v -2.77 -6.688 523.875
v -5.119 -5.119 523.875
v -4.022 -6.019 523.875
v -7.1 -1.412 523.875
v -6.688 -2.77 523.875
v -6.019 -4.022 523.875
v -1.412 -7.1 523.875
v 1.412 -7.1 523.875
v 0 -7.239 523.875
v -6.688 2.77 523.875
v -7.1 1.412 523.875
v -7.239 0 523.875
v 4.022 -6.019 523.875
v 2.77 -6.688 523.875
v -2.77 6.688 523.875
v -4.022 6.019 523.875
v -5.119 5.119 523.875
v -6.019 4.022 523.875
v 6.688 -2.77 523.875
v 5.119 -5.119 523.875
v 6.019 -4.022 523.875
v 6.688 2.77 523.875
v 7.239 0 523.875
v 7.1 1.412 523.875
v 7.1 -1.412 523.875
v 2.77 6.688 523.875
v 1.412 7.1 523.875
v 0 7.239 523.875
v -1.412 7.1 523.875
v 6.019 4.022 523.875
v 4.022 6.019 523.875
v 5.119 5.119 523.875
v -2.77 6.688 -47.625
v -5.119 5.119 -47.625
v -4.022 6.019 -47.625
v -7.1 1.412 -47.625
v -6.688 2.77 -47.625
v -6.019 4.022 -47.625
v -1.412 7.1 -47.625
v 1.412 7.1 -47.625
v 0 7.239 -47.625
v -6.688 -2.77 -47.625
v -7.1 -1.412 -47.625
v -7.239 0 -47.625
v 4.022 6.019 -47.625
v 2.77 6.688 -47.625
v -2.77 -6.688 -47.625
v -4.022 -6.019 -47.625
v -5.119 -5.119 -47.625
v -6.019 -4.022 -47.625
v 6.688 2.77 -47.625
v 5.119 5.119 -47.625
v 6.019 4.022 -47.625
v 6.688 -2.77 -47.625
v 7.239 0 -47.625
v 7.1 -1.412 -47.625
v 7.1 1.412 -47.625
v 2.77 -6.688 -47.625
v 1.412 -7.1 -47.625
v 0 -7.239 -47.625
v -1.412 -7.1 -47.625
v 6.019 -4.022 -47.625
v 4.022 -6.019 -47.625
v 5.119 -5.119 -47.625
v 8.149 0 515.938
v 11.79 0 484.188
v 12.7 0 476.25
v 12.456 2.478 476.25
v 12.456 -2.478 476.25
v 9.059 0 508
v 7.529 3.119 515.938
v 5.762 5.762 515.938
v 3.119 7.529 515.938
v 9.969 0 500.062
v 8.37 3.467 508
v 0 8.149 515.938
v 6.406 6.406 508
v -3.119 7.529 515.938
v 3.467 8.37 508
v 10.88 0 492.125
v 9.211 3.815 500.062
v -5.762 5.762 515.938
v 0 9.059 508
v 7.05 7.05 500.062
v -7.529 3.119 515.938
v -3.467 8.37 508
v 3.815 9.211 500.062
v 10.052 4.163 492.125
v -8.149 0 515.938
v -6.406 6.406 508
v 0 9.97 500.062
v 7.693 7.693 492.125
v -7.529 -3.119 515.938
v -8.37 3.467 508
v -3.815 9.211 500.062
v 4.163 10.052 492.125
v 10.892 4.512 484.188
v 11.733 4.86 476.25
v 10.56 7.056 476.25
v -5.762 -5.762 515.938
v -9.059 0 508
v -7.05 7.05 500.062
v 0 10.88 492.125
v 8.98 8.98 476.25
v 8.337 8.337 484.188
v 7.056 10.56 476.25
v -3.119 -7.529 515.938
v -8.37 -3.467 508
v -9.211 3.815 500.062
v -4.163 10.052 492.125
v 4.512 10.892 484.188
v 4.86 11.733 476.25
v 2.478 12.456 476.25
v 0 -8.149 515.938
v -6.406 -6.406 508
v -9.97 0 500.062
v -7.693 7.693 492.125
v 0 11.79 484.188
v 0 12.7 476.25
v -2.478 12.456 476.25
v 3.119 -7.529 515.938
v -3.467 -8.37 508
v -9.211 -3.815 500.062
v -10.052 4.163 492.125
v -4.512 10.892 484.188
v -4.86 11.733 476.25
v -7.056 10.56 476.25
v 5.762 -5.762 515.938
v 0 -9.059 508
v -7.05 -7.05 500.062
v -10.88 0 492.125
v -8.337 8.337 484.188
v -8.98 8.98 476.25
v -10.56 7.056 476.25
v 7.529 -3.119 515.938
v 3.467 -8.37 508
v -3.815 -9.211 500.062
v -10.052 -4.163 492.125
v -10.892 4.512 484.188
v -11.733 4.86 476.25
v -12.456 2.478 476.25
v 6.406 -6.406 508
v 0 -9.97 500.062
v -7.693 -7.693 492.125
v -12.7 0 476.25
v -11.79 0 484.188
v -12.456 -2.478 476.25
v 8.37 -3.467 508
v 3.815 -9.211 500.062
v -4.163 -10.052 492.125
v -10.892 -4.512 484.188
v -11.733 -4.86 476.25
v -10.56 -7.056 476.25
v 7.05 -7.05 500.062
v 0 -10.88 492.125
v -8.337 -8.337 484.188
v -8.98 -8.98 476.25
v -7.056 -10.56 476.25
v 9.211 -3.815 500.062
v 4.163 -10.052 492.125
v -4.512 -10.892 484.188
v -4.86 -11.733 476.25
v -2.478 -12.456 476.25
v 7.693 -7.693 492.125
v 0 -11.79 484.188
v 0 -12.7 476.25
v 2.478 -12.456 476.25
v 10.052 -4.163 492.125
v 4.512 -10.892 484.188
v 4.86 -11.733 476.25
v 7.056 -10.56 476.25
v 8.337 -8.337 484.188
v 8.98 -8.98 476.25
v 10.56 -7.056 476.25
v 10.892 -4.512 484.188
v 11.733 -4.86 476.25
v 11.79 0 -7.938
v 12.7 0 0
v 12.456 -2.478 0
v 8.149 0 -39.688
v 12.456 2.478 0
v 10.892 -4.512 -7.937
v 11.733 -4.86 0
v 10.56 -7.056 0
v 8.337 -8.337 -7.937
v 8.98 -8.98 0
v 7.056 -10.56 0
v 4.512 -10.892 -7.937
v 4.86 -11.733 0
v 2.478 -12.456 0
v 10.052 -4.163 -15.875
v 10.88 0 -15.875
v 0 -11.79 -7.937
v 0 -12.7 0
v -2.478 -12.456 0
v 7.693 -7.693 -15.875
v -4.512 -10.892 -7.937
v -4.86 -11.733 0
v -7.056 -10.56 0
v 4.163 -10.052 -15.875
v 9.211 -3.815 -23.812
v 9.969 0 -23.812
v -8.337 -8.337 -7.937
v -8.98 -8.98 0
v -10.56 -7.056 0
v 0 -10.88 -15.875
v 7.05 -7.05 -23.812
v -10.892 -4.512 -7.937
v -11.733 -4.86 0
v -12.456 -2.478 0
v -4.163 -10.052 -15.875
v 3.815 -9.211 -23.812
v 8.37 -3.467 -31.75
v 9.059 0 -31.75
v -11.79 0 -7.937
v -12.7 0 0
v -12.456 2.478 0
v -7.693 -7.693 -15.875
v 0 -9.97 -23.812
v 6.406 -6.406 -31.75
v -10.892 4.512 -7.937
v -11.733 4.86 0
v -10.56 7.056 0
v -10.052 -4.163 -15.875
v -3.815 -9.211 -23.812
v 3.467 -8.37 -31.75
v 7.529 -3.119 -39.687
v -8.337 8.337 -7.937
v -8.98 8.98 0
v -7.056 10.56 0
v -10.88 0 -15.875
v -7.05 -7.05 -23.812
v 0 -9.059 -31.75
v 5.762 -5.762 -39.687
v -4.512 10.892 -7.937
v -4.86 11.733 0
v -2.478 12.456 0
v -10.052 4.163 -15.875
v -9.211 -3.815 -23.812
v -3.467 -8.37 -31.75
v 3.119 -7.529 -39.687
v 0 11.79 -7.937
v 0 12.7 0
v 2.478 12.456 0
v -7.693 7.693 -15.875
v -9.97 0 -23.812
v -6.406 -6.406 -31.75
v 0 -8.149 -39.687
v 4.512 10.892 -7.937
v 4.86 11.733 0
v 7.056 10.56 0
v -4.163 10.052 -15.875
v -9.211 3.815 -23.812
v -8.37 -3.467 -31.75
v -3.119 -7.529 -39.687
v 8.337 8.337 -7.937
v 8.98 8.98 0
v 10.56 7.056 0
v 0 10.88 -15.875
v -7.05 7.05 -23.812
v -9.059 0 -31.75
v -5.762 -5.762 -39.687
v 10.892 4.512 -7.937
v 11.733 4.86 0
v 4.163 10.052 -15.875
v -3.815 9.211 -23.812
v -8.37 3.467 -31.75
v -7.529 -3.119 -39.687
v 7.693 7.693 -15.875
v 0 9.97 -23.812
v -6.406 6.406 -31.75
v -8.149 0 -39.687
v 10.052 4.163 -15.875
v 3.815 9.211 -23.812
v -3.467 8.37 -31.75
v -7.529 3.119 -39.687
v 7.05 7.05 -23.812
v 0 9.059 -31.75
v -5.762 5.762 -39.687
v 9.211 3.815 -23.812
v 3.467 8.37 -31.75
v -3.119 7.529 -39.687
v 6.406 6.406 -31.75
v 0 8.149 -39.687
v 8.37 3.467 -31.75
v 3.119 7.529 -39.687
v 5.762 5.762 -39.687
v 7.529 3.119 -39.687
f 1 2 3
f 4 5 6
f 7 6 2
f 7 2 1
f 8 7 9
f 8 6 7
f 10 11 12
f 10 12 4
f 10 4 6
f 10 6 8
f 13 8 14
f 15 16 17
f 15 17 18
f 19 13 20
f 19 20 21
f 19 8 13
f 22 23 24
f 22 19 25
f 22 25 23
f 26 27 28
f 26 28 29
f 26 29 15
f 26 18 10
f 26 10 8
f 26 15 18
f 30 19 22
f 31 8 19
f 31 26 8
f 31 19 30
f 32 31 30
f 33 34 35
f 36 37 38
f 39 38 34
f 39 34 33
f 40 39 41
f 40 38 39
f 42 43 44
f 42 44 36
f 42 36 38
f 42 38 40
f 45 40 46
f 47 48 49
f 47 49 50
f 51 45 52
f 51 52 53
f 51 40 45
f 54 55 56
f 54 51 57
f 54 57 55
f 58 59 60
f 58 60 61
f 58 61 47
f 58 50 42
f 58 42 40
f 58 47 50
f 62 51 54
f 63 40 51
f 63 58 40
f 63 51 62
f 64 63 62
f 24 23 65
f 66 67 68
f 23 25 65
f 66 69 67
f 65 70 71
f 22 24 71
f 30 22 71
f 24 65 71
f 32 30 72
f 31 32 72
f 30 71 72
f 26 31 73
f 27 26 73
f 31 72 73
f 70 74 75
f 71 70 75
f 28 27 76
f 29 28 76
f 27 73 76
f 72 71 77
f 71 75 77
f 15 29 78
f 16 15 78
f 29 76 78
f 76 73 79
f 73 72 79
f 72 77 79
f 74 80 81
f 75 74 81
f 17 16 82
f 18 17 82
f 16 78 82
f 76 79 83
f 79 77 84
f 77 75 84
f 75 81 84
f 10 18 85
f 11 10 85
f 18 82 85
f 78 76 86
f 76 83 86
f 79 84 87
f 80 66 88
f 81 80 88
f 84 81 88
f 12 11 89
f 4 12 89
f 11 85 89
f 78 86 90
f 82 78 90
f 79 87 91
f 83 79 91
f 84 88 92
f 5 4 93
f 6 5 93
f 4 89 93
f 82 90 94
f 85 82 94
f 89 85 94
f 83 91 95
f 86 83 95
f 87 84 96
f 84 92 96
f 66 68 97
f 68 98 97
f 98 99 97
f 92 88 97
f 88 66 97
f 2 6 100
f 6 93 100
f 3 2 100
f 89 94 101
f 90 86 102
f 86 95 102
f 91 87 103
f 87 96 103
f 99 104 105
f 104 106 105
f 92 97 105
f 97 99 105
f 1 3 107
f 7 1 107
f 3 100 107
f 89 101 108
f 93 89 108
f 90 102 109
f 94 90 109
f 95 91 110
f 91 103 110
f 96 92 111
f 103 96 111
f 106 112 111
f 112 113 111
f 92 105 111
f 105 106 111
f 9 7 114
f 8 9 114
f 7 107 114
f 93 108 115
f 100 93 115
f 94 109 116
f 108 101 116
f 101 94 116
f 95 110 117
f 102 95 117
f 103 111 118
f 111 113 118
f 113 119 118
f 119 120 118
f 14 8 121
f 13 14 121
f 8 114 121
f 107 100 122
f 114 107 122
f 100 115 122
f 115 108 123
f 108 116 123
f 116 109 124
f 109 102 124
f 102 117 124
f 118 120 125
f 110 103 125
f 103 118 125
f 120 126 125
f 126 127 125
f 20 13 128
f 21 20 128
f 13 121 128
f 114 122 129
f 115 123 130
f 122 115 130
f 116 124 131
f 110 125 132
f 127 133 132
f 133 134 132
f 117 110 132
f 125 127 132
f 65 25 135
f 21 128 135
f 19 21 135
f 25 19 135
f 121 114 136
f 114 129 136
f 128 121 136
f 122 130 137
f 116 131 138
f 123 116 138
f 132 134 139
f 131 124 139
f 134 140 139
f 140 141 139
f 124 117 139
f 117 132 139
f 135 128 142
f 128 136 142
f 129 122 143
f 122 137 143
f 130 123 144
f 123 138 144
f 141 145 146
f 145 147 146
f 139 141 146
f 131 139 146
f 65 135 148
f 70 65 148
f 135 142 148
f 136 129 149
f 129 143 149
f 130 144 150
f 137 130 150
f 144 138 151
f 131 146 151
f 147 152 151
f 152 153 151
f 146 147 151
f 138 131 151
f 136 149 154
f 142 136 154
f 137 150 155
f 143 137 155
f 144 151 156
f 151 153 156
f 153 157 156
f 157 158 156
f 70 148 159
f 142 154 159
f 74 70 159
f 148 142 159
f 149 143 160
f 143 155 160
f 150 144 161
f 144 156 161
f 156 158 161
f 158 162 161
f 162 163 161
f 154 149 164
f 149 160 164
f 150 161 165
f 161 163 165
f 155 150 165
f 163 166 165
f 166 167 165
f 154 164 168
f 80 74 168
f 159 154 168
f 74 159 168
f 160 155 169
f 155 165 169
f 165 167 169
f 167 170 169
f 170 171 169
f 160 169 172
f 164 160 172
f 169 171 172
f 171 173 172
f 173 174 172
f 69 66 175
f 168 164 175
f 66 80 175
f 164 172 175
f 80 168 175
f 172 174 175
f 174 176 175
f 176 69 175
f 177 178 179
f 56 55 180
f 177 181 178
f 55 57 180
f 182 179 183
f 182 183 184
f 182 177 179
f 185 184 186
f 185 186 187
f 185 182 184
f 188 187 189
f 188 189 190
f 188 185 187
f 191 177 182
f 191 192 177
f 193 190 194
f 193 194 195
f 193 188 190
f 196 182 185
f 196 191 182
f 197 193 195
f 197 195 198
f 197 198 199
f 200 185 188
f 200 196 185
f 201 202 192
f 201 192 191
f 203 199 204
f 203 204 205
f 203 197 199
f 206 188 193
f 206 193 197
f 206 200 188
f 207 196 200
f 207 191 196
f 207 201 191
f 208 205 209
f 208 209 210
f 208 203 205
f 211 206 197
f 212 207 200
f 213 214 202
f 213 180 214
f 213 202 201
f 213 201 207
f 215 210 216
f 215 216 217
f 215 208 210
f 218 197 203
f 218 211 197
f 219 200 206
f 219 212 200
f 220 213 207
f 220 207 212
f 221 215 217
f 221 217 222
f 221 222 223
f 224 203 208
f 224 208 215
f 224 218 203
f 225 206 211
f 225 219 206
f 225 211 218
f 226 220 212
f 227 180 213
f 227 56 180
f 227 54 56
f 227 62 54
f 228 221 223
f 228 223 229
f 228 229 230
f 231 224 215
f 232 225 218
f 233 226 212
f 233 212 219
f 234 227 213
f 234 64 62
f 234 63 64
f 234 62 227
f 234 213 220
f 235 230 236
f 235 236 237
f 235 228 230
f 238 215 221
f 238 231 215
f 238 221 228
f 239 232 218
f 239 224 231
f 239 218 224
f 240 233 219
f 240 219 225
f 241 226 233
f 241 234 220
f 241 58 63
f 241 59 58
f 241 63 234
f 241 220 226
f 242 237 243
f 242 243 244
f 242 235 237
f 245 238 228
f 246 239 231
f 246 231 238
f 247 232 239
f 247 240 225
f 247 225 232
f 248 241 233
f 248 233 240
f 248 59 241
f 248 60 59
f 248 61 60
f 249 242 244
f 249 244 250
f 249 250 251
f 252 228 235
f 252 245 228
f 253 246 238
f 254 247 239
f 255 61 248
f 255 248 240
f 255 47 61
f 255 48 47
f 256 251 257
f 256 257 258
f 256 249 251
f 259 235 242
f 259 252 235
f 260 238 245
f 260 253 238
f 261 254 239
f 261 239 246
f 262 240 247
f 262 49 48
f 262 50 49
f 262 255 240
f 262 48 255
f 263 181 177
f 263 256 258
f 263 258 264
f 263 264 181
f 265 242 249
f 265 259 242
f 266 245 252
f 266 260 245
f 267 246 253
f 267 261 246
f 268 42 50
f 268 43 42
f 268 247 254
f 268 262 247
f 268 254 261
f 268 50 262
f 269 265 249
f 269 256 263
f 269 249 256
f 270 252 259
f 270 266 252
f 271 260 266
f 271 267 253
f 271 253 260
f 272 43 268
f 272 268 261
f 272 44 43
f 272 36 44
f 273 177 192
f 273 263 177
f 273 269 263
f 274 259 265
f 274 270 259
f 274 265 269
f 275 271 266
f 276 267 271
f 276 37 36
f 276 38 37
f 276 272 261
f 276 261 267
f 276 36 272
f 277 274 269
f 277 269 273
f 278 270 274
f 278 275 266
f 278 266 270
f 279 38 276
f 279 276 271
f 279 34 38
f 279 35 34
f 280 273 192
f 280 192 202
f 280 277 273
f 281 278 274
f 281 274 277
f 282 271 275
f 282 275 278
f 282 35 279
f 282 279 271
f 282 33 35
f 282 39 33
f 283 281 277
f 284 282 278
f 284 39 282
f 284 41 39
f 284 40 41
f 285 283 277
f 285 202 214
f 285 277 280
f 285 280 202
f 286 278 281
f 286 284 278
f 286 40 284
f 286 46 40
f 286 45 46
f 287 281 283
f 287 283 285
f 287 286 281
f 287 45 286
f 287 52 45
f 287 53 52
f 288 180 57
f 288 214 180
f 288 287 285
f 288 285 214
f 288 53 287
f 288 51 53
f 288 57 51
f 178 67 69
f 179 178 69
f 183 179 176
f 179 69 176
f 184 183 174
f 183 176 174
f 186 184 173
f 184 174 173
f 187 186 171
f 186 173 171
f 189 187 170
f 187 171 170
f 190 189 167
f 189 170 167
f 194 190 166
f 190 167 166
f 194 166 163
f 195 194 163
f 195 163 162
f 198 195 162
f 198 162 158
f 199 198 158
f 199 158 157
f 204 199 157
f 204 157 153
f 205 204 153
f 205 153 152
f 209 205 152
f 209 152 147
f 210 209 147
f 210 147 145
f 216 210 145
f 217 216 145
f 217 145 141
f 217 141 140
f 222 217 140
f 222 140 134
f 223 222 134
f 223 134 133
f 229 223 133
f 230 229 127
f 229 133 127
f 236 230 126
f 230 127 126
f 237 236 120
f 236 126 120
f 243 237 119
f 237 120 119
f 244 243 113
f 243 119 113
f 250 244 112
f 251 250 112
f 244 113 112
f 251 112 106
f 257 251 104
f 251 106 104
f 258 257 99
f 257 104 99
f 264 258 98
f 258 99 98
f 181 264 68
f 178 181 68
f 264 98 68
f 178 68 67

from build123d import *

# Parameters (mm, degrees)
F0_R     = 12.7
F1_DEPTH = 476.25
F2_R     = 12.7
F3_DEPTH = 47.625
F4_SIZE2 = 47.625
F4_SIZE  = 5.461
F5_R     = 12.7
F6_DEPTH = 47.625
F7_SIZE2 = 5.461
F7_SIZE  = 47.625


with BuildPart() as f1:
    # F0 (on Top) → F1 (new body)
    with BuildSketch(Plane.XY):
        Circle(F0_R)
    extrude(amount=F1_DEPTH)

    # F2 (on face) → F3 (join)
    with BuildSketch(Plane.XY.offset(476.25)):
        Circle(F2_R)
    extrude(amount=F3_DEPTH)

    # F4
    f4_edges = [f1.edges().sort_by_distance(p)[0] for p in [
        (-12.7, 0, 523.875),
    ]]
    f4_side = f1.faces().sort_by_distance((0, 0, 523.875))[0]
    chamfer(f4_edges, length=F4_SIZE, length2=F4_SIZE2, reference=f4_side)

    # F5 (on face) → F6 (join)
    with BuildSketch(Plane(origin=(0, 0, 0), x_dir=(1, 0, 0), z_dir=(0, 0, -1))):
        Circle(F5_R)
    extrude(amount=F6_DEPTH)

    # F7
    f7_edges = [f1.edges().sort_by_distance(p)[0] for p in [
        (-12.7, 0, -47.625),
    ]]
    f7_side = f1.faces().sort_by_distance((-12.7, 0, 214.3125))[0]
    chamfer(f7_edges, length=F7_SIZE, length2=F7_SIZE2, reference=f7_side)


solid = f1.part
